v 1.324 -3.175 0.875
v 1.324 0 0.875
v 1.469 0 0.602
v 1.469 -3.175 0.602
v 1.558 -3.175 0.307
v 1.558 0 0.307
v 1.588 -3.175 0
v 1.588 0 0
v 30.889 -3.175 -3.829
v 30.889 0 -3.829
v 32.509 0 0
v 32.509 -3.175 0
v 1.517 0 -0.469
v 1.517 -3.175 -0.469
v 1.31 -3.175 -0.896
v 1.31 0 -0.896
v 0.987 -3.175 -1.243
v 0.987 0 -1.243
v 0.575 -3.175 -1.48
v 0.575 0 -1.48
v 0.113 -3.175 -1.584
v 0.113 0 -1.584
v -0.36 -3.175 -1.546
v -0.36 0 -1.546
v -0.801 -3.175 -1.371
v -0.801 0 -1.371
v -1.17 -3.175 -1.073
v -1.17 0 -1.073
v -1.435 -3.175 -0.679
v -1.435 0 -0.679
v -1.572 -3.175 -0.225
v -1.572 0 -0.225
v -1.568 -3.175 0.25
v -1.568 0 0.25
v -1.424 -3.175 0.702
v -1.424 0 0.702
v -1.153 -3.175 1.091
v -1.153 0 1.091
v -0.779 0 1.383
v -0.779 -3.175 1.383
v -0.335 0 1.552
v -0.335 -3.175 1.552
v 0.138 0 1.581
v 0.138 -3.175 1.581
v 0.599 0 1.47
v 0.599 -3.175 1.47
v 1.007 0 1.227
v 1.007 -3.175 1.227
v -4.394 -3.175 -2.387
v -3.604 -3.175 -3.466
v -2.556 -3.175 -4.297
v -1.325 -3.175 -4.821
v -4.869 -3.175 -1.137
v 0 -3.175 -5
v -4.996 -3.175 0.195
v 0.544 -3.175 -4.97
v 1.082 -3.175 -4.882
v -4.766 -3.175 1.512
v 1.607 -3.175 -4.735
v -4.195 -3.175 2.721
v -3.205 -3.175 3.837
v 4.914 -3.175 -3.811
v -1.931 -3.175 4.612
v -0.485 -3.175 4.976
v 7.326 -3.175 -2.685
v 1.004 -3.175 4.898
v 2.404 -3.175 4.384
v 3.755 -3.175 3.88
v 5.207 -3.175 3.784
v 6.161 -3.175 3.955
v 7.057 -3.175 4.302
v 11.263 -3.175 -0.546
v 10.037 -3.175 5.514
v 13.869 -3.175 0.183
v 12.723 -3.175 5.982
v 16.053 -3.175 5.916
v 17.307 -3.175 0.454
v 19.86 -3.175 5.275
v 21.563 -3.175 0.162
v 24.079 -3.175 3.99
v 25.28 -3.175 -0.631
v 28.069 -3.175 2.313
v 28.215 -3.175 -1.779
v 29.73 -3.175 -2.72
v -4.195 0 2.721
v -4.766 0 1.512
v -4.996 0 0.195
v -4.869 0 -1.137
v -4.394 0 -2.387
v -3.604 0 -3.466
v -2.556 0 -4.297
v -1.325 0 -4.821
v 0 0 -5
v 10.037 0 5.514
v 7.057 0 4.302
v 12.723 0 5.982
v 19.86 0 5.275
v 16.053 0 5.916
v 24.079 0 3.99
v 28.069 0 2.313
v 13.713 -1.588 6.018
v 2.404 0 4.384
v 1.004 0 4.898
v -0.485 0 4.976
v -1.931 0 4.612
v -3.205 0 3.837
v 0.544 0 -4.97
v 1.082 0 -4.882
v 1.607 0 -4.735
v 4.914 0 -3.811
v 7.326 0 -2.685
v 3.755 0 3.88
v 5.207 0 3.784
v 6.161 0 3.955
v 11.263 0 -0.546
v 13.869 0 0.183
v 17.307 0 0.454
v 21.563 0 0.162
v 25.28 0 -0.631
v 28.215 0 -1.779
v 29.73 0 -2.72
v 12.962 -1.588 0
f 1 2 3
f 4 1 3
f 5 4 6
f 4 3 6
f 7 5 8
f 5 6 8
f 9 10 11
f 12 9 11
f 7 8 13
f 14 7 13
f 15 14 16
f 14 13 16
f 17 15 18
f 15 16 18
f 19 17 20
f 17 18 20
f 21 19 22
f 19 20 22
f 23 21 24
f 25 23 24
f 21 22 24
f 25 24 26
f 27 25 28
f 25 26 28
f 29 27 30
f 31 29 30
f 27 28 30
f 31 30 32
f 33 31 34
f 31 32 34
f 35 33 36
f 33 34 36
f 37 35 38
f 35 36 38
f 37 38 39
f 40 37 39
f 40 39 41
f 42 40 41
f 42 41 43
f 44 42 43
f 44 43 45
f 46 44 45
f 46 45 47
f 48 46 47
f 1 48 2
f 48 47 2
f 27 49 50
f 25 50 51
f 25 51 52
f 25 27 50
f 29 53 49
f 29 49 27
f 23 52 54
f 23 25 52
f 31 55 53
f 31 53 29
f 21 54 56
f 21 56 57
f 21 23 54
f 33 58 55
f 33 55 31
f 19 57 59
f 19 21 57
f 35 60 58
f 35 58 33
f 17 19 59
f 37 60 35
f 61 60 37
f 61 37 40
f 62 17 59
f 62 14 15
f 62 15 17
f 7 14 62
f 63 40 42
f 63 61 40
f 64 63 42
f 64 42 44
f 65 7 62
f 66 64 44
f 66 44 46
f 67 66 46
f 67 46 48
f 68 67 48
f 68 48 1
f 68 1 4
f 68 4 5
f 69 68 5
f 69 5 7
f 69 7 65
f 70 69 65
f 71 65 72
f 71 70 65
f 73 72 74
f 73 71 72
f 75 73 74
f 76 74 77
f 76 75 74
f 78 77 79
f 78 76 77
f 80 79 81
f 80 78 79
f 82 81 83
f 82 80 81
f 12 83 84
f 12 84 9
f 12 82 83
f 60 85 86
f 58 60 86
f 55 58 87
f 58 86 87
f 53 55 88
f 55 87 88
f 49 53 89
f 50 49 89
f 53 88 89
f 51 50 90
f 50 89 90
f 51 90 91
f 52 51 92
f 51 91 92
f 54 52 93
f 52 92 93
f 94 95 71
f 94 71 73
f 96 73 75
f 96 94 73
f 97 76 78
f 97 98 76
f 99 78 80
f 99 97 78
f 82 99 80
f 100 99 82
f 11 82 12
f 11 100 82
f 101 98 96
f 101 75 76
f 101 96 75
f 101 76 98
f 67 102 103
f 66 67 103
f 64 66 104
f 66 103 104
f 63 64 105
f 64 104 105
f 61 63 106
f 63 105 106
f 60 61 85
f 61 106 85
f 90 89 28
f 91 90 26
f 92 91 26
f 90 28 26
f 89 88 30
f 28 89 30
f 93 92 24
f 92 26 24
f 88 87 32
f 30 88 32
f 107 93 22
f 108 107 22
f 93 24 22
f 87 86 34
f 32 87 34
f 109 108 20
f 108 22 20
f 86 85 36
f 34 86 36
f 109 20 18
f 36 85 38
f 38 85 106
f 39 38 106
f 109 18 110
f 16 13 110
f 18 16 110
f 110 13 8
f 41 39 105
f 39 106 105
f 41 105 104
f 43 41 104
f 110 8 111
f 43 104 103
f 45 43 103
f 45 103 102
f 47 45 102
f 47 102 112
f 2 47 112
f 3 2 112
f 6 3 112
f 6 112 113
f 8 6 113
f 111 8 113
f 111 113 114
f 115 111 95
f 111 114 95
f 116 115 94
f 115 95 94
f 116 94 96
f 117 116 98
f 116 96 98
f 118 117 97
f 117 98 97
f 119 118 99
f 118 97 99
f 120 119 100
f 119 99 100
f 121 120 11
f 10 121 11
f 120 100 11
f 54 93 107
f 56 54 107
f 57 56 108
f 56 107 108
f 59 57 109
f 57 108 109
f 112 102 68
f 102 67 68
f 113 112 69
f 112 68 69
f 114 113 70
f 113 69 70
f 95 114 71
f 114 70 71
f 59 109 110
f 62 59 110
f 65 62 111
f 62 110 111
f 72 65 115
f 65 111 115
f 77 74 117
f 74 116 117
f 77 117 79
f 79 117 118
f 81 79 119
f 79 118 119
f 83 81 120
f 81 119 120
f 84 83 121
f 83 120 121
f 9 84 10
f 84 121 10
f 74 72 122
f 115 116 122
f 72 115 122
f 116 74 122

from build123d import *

# Parameters (mm, degrees)
F1_DEPTH = 3.175
F2_R     = 5


# Not quite as in the source:
# - a length typed as a fraction of an inch, garbled in the dataset ("3 / 203.2 mm" for 3/8 in), is restored


with BuildPart() as f1:
    # F0 (on Front) → F1 (new body)
    with BuildSketch(Plane.XZ):
        with BuildLine():
            ThreePointArc((5, 0), (4.7976890268, 1.4078991449), (4.2071279991, 2.7018649113))
            ThreePointArc((4.2071279991, 2.7018649113), (0.0116152193, 4.9999865086), (-4.1945295238, 2.7213823829))
            ThreePointArc((-4.1945295238, 2.7213823829), (-4.3935698421, -2.3867433969), (0, -5))
            add(Edge.make_bspline(
                [(0, -5), (0.5720738613, -4.9218364583), (1.1062852924, -4.8328629446), (1.6070336906, -4.7347061912)],
                knots=[0, 0, 0, 0, 0.0353074902, 0.0353074902, 0.0353074902, 0.0353074902], degree=3))
            ThreePointArc((1.6070336906, -4.7347061912), (3.070488906, -3.9461497536), (4.1945295238, -2.7213823829))
            ThreePointArc((4.1945295238, -2.7213823829), (4.7944054699, -1.4190405881), (5, 0))
        make_face()
        with BuildLine():
            ThreePointArc((1.3244951977, 0.8751392582), (1.5203276582, 0.4569026831), (1.5875, 0))
            ThreePointArc((1.5875, 0), (-1.5203276582, -0.4569026831), (1.3244951977, 0.8751392582))
        make_face(mode=Mode.SUBTRACT)
        with BuildLine():
            add(Edge.make_bspline(
                [(4.2071279991, 2.7018649113), (8.5330066632, 5.3268453963), (13.9608292527, 6.9611647512), (24.1781340673, 4.7387528577), (32.5091555715, 0)],
                knots=[0.1019845344, 0.1019845344, 0.1019845344, 0.1019845344, 0.46554979, 1, 1, 1, 1], degree=3))
            ThreePointArc((4.2071279991, 2.7018649113), (4.7976890268, 1.4078991449), (5, 0))
            ThreePointArc((5, 0), (4.7944054699, -1.4190405881), (4.1945295238, -2.7213823829))
            ThreePointArc((4.1945295238, -2.7213823829), (3.070488906, -3.9461497536), (1.6070336906, -4.7347061912))
            add(Edge.make_bspline(
                [(1.6070336906, -4.7347061912), (7.7069500406, -3.5389999501), (10.2510979188, 2.1993831398), (27.8217853485, 0), (30.8888312429, -3.8289688528)],
                knots=[0.0353074902, 0.0353074902, 0.0353074902, 0.0353074902, 0.4654091895, 1, 1, 1, 1], degree=3))
            Line((30.8888312429, -3.8289688528), (32.5091555715, 0))
        make_face()
        with BuildLine():
            add(Edge.make_bspline(
                [(0, -5), (0.5720738613, -4.9218364583), (1.1062852924, -4.8328629446), (1.6070336906, -4.7347061912)],
                knots=[0, 0, 0, 0, 0.0353074902, 0.0353074902, 0.0353074902, 0.0353074902], degree=3))
            ThreePointArc((0, -5), (0.814392118, -4.9332307343), (1.6070336906, -4.7347061912))
        make_face()
    extrude(amount=F1_DEPTH)

    # F2
    f2_edges = [f1.edges().sort_by_distance(p)[0] for p in [
        (4.207128, -1.5875, 2.701865),
    ]]
    fillet(f2_edges, radius=F2_R)


solid = f1.part
